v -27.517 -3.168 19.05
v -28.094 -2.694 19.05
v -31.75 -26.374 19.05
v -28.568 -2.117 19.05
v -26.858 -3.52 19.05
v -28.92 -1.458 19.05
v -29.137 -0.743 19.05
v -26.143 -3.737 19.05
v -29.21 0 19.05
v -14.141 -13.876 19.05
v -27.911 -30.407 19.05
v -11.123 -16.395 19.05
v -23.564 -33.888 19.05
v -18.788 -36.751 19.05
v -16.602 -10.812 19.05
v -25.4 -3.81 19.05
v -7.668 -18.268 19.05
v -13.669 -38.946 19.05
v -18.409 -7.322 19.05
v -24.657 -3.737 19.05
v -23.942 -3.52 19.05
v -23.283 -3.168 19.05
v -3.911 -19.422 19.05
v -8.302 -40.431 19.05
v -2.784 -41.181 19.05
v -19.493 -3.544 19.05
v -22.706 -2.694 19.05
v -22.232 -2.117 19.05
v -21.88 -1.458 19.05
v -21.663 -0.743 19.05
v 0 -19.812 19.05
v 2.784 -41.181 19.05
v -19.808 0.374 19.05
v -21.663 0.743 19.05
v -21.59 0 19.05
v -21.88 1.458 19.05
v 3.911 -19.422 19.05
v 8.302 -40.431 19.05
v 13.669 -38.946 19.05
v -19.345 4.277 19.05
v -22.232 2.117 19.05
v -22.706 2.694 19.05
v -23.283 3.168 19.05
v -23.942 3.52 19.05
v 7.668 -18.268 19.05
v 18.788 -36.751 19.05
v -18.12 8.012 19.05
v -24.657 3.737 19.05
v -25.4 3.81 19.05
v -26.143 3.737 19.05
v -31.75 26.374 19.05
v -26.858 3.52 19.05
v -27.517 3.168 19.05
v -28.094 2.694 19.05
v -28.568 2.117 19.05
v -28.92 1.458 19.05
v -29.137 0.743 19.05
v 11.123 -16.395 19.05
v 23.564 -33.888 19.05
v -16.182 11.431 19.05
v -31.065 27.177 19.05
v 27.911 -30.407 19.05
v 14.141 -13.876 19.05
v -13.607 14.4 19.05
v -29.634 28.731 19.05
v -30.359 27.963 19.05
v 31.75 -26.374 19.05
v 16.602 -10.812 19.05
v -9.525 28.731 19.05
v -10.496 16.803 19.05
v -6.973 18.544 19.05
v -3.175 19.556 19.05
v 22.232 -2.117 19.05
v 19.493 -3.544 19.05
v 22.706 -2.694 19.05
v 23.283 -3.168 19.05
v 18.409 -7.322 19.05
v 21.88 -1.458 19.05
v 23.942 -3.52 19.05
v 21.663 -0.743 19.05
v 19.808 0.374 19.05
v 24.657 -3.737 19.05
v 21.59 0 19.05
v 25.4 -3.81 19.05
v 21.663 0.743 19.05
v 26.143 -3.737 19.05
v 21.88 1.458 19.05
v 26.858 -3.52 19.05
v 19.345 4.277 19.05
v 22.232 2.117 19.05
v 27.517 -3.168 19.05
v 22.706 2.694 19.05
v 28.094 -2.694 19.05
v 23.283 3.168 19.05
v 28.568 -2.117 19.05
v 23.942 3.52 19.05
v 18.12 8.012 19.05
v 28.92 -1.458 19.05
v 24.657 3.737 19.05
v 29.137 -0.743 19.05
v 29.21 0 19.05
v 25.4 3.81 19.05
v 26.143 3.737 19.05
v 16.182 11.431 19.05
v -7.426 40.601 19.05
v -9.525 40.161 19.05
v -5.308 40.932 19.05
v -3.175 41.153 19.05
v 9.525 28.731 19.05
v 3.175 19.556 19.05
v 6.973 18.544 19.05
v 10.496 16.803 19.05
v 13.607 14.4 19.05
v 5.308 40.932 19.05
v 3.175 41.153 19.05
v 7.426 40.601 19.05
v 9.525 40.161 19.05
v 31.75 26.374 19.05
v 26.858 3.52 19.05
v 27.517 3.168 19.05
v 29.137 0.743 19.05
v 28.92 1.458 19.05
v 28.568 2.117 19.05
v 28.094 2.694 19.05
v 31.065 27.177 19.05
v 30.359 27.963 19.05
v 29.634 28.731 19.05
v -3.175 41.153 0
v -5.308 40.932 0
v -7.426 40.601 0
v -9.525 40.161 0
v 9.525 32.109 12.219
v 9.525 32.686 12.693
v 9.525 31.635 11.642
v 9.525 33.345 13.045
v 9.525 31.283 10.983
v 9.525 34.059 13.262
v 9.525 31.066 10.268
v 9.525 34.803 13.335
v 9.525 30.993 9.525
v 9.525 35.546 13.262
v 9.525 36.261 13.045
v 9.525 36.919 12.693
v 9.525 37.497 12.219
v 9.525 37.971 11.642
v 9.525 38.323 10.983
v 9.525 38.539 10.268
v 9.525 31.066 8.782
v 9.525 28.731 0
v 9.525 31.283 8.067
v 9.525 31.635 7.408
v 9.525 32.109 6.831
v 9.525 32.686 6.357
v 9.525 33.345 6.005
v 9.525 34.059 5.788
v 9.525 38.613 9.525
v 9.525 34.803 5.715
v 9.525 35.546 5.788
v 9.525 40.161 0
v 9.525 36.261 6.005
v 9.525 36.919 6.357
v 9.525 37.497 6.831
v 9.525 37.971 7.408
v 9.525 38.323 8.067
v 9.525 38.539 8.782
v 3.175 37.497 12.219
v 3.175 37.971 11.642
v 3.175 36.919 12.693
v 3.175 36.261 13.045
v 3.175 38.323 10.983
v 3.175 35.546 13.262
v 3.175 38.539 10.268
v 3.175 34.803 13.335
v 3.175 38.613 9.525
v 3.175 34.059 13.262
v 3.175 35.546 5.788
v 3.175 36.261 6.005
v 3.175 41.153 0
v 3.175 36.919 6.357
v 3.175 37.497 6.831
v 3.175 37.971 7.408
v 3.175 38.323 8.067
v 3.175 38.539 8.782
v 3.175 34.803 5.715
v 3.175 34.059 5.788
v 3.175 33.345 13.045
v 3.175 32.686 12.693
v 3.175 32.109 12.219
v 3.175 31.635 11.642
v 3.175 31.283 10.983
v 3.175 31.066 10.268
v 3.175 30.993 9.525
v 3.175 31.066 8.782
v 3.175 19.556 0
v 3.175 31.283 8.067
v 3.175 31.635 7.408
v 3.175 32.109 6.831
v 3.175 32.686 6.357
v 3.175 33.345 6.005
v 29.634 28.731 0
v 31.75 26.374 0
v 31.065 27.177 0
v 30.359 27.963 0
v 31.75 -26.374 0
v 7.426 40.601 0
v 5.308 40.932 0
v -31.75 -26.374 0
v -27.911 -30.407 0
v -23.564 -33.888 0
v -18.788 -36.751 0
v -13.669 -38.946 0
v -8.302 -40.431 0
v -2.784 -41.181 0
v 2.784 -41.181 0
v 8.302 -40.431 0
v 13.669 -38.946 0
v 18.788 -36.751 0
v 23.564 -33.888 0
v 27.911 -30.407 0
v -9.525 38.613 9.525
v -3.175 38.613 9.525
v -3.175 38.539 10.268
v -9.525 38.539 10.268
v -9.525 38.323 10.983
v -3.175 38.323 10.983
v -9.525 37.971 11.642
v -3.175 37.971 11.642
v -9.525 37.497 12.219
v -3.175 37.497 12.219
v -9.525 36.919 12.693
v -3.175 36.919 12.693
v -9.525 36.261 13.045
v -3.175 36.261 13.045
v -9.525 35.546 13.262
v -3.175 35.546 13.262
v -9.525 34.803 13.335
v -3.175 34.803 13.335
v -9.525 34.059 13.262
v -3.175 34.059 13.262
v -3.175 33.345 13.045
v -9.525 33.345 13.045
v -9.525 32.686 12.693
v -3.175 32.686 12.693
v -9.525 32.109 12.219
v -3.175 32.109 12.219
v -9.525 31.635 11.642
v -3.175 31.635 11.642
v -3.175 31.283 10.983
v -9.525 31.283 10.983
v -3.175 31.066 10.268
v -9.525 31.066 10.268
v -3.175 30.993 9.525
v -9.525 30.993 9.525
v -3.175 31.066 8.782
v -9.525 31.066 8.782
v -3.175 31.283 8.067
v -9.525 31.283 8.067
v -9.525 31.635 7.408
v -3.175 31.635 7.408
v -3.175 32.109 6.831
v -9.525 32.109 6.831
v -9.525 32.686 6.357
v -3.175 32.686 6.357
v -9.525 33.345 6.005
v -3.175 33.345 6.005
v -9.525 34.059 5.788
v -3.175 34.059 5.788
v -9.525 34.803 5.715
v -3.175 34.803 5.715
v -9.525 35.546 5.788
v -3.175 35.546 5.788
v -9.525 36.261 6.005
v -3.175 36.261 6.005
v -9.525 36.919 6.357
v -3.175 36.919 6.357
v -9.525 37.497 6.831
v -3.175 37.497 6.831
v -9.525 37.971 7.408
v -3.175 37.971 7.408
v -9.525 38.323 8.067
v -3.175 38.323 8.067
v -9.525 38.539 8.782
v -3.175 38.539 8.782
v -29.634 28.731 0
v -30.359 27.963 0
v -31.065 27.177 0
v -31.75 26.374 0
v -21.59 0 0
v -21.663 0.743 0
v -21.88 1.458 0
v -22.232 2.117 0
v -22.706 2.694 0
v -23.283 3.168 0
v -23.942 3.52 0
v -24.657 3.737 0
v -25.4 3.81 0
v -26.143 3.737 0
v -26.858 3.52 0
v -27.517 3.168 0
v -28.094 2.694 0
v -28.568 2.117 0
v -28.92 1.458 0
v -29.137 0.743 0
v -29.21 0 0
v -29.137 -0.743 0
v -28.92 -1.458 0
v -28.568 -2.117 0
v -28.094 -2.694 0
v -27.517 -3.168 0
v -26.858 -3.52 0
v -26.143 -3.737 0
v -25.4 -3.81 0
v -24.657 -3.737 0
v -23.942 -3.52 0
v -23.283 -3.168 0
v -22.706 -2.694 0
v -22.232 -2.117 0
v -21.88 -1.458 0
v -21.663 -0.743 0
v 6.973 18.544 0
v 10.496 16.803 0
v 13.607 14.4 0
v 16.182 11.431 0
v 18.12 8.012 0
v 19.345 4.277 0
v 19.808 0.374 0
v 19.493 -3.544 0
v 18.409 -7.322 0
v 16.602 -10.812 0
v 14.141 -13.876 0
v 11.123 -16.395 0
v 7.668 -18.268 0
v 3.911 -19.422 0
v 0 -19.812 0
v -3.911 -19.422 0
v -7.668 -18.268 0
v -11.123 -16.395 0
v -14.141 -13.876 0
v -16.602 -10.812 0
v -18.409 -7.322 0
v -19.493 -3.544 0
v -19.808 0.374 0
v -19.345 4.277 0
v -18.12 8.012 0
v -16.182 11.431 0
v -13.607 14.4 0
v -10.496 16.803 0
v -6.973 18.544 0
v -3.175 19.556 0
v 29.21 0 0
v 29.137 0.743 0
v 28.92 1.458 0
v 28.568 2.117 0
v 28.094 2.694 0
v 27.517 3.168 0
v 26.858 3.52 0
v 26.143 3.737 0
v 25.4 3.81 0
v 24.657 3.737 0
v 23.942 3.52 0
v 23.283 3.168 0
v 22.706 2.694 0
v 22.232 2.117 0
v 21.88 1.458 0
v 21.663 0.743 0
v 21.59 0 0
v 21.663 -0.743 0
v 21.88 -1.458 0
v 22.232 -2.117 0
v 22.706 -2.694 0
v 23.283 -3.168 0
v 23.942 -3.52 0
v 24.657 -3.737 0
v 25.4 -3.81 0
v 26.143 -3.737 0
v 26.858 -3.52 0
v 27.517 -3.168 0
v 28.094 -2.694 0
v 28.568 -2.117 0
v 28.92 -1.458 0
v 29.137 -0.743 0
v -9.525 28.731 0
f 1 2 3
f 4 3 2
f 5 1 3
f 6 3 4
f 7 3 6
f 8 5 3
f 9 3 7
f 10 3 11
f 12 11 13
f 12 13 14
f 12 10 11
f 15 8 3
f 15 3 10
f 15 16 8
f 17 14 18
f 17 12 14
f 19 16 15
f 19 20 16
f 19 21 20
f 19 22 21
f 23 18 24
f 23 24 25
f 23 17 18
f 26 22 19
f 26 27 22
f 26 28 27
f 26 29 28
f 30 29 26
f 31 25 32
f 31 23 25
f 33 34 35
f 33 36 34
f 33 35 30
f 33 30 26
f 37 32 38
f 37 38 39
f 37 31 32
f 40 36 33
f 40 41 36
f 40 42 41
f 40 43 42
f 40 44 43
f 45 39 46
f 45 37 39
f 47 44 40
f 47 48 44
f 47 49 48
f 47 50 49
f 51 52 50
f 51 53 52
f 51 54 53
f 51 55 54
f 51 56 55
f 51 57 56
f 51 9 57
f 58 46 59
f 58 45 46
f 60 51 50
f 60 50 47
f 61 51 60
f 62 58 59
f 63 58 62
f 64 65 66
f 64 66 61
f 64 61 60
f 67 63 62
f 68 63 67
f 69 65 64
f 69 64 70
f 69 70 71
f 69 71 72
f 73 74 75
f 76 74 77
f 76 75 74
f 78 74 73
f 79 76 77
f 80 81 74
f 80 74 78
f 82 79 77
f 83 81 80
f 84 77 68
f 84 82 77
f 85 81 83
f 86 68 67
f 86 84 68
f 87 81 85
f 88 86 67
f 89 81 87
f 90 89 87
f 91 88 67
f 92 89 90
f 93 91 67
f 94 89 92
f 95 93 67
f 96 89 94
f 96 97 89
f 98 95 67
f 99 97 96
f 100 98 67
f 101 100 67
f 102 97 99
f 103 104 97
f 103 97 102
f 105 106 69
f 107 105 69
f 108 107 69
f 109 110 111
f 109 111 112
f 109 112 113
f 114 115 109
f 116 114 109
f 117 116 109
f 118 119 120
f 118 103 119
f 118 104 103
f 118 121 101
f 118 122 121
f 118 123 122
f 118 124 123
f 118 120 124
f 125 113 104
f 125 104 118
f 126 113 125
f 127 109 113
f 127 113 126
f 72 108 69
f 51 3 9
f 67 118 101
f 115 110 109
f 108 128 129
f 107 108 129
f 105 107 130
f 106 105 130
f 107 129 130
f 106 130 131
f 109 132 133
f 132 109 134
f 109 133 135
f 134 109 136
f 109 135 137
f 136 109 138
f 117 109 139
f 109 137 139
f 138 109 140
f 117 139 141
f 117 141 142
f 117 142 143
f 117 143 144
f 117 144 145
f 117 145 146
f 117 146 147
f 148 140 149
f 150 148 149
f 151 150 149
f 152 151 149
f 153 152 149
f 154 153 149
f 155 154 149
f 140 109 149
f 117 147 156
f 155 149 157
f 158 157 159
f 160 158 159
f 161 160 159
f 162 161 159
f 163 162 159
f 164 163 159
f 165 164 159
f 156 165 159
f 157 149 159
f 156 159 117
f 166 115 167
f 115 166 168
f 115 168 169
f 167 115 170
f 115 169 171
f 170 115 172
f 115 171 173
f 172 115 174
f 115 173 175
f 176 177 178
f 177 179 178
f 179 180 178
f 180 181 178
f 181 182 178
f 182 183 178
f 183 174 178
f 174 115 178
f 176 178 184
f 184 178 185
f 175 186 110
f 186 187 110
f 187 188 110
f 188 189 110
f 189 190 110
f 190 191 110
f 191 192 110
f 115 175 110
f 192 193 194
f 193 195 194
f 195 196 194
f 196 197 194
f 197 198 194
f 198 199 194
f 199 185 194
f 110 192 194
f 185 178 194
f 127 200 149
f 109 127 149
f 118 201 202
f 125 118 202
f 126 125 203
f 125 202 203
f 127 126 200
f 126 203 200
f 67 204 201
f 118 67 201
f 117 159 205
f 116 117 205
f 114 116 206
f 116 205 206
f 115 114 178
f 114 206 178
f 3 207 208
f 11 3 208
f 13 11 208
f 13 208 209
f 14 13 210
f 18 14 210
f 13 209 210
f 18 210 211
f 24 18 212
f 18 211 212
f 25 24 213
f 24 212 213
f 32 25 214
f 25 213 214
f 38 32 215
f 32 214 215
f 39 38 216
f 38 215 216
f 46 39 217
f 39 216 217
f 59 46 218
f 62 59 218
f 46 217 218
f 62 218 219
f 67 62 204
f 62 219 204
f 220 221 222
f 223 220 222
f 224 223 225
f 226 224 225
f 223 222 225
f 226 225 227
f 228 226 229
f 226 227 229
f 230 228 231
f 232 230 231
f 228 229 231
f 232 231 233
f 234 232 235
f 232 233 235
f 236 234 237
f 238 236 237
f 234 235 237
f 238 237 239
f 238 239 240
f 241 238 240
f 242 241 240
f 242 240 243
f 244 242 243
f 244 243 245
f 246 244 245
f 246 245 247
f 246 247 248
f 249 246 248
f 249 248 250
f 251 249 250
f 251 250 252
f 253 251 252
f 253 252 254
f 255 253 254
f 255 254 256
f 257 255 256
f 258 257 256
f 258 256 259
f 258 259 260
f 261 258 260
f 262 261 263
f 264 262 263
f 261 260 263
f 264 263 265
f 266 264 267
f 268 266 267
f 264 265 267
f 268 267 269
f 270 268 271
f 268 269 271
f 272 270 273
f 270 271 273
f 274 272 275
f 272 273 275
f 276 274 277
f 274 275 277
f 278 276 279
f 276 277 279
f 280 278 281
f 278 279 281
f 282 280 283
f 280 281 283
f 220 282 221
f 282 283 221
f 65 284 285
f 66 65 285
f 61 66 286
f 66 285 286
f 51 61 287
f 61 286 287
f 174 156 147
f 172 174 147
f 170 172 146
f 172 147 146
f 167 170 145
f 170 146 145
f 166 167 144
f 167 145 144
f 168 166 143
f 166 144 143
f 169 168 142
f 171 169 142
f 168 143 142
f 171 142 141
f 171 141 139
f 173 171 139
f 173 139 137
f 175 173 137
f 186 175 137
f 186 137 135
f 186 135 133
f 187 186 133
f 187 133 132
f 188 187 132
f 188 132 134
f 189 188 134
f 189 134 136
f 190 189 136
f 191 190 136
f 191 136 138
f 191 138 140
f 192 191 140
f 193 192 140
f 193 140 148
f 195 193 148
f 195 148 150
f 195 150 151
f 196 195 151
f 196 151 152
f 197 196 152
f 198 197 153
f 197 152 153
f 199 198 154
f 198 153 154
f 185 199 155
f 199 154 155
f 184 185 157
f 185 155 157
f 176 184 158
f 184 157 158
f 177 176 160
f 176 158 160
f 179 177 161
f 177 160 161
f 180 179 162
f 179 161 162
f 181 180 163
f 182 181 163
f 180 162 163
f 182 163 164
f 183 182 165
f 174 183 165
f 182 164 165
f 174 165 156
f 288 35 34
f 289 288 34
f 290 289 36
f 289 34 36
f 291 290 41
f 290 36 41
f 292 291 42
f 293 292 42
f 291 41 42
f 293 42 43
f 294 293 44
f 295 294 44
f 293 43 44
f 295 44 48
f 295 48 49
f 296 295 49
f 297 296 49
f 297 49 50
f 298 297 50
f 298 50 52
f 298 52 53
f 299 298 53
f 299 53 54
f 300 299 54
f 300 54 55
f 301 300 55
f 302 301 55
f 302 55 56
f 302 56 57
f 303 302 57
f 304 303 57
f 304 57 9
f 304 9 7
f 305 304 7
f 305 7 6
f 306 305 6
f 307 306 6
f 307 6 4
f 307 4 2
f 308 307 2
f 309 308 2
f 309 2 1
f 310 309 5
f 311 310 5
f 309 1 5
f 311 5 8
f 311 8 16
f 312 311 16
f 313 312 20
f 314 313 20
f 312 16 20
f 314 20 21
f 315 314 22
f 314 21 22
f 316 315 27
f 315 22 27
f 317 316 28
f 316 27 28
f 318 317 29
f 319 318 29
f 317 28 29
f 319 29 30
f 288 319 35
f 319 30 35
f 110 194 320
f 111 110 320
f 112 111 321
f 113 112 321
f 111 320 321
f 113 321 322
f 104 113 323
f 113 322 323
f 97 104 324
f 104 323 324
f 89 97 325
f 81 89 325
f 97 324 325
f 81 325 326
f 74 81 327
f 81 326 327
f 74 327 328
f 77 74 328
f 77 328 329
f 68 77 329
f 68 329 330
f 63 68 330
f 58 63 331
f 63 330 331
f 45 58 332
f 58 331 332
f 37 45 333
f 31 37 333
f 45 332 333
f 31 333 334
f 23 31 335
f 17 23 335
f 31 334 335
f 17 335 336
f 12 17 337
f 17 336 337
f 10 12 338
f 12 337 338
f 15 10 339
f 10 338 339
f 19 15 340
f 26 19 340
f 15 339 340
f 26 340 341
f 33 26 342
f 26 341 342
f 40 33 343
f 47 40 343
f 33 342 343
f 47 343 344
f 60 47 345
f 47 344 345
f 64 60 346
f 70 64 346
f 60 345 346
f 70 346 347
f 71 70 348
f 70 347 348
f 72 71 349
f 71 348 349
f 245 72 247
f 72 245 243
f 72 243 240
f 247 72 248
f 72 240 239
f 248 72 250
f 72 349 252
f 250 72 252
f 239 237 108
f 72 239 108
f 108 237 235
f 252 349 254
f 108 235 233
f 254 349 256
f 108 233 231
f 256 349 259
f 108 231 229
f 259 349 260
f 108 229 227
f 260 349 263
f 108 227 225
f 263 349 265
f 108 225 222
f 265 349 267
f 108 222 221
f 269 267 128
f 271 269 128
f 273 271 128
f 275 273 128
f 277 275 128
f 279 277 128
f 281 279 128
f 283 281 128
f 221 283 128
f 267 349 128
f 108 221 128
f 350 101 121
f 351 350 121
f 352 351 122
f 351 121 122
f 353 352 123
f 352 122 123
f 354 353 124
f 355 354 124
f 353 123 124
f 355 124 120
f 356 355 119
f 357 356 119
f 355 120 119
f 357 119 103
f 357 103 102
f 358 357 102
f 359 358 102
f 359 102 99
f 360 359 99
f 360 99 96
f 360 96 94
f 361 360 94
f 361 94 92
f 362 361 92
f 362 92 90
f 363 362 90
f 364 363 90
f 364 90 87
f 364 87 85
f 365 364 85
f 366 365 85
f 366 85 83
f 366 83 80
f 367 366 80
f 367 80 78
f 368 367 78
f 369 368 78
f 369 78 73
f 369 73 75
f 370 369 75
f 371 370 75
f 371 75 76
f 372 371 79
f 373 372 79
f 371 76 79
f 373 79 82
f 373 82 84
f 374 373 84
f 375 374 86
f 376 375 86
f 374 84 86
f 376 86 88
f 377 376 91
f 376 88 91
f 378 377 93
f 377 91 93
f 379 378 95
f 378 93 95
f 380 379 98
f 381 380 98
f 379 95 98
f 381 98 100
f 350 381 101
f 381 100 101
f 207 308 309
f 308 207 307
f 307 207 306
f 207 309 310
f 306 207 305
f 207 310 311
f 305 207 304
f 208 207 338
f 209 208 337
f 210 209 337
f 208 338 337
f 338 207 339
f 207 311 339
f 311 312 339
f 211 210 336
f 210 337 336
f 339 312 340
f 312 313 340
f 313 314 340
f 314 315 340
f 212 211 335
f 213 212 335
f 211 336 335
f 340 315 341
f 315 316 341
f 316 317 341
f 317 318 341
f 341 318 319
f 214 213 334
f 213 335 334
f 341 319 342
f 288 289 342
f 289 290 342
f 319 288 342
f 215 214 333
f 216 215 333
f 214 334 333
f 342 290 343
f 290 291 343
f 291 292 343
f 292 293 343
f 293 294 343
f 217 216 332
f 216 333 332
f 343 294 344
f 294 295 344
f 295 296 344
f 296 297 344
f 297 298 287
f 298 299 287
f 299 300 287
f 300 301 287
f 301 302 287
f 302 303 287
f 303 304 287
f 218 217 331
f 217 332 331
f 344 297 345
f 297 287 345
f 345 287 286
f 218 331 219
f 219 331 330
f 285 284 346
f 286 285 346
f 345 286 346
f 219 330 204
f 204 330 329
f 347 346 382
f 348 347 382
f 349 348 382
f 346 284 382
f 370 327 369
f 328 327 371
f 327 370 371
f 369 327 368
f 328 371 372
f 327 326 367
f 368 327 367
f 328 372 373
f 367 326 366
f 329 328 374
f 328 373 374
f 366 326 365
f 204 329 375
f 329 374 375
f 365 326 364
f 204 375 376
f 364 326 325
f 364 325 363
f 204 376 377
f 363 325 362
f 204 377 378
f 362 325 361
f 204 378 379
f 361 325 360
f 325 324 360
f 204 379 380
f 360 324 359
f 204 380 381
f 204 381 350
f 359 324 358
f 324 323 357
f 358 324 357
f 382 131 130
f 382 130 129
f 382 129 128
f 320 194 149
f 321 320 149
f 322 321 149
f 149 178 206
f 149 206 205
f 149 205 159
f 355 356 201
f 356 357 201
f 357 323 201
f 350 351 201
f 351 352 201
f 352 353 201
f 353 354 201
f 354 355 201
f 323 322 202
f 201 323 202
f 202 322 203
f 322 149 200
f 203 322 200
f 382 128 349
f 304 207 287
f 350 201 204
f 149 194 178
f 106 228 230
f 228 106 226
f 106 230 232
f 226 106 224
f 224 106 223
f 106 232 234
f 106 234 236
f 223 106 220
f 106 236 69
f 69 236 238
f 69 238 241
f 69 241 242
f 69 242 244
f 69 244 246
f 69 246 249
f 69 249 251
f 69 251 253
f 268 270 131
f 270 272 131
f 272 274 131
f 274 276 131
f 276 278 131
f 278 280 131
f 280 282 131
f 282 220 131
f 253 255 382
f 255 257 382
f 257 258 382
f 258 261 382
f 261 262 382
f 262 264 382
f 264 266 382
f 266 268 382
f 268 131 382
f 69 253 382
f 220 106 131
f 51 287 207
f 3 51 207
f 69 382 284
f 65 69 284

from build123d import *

# Parameters (mm, degrees)
F1_DEPTH = 19.05
F2_R     = 3.81
F3_DEPTH = 25.4
F4_R     = 3.81
F5_DEPTH = 25.4


with BuildPart() as f1:
    # F0 (on Top) → F1 (new body)
    with BuildSketch(Plane.XY):
        with BuildLine():
            Line((-3.175, 19.555938), (-3.175, 41.152703))
            ThreePointArc((-3.175, 41.152703), (-6.369333, 40.780599), (-9.525, 40.160926))
            Line((-9.525, 40.160926), (-9.525, 28.730926))
            Line((-9.525, 28.730926), (-29.633756, 28.730926))
            ThreePointArc((-29.633756, 28.730926), (-30.714503, 27.572539), (-31.75, 26.373531))
            Line((-31.75, 26.373531), (-31.75, -26.373531))
            ThreePointArc((-31.75, -26.373531), (0, -41.275), (31.75, -26.373531))
            Line((31.75, -26.373531), (31.75, 26.373531))
            ThreePointArc((31.75, 26.373531), (30.714503, 27.572539), (29.633756, 28.730926))
            Line((29.633756, 28.730926), (9.525, 28.730926))
            Line((9.525, 28.730926), (9.525, 40.160926))
            ThreePointArc((9.525, 40.160926), (6.369333, 40.780599), (3.175, 41.152703))
            Line((3.175, 41.152703), (3.175, 19.555938))
            ThreePointArc((3.175, 19.555938), (0, -19.812), (-3.175, 19.555938))
        make_face()
    extrude(amount=F1_DEPTH)

    # F2 (on face) → F3 (cut)
    with BuildSketch(Plane.XY.offset(19.05)):
        with Locations((25.4, 0)):
            Circle(F2_R)
        with Locations((-25.4, 0)):
            Circle(F2_R)
    extrude(amount=-F3_DEPTH, mode=Mode.SUBTRACT)

    # F4 (on face) → F5 (cut)
    with BuildSketch(Plane.YZ.offset(9.525)):
        with Locations((34.802703, 9.525)):
            Circle(F4_R)
    extrude(amount=-F5_DEPTH, mode=Mode.SUBTRACT)


solid = f1.part
